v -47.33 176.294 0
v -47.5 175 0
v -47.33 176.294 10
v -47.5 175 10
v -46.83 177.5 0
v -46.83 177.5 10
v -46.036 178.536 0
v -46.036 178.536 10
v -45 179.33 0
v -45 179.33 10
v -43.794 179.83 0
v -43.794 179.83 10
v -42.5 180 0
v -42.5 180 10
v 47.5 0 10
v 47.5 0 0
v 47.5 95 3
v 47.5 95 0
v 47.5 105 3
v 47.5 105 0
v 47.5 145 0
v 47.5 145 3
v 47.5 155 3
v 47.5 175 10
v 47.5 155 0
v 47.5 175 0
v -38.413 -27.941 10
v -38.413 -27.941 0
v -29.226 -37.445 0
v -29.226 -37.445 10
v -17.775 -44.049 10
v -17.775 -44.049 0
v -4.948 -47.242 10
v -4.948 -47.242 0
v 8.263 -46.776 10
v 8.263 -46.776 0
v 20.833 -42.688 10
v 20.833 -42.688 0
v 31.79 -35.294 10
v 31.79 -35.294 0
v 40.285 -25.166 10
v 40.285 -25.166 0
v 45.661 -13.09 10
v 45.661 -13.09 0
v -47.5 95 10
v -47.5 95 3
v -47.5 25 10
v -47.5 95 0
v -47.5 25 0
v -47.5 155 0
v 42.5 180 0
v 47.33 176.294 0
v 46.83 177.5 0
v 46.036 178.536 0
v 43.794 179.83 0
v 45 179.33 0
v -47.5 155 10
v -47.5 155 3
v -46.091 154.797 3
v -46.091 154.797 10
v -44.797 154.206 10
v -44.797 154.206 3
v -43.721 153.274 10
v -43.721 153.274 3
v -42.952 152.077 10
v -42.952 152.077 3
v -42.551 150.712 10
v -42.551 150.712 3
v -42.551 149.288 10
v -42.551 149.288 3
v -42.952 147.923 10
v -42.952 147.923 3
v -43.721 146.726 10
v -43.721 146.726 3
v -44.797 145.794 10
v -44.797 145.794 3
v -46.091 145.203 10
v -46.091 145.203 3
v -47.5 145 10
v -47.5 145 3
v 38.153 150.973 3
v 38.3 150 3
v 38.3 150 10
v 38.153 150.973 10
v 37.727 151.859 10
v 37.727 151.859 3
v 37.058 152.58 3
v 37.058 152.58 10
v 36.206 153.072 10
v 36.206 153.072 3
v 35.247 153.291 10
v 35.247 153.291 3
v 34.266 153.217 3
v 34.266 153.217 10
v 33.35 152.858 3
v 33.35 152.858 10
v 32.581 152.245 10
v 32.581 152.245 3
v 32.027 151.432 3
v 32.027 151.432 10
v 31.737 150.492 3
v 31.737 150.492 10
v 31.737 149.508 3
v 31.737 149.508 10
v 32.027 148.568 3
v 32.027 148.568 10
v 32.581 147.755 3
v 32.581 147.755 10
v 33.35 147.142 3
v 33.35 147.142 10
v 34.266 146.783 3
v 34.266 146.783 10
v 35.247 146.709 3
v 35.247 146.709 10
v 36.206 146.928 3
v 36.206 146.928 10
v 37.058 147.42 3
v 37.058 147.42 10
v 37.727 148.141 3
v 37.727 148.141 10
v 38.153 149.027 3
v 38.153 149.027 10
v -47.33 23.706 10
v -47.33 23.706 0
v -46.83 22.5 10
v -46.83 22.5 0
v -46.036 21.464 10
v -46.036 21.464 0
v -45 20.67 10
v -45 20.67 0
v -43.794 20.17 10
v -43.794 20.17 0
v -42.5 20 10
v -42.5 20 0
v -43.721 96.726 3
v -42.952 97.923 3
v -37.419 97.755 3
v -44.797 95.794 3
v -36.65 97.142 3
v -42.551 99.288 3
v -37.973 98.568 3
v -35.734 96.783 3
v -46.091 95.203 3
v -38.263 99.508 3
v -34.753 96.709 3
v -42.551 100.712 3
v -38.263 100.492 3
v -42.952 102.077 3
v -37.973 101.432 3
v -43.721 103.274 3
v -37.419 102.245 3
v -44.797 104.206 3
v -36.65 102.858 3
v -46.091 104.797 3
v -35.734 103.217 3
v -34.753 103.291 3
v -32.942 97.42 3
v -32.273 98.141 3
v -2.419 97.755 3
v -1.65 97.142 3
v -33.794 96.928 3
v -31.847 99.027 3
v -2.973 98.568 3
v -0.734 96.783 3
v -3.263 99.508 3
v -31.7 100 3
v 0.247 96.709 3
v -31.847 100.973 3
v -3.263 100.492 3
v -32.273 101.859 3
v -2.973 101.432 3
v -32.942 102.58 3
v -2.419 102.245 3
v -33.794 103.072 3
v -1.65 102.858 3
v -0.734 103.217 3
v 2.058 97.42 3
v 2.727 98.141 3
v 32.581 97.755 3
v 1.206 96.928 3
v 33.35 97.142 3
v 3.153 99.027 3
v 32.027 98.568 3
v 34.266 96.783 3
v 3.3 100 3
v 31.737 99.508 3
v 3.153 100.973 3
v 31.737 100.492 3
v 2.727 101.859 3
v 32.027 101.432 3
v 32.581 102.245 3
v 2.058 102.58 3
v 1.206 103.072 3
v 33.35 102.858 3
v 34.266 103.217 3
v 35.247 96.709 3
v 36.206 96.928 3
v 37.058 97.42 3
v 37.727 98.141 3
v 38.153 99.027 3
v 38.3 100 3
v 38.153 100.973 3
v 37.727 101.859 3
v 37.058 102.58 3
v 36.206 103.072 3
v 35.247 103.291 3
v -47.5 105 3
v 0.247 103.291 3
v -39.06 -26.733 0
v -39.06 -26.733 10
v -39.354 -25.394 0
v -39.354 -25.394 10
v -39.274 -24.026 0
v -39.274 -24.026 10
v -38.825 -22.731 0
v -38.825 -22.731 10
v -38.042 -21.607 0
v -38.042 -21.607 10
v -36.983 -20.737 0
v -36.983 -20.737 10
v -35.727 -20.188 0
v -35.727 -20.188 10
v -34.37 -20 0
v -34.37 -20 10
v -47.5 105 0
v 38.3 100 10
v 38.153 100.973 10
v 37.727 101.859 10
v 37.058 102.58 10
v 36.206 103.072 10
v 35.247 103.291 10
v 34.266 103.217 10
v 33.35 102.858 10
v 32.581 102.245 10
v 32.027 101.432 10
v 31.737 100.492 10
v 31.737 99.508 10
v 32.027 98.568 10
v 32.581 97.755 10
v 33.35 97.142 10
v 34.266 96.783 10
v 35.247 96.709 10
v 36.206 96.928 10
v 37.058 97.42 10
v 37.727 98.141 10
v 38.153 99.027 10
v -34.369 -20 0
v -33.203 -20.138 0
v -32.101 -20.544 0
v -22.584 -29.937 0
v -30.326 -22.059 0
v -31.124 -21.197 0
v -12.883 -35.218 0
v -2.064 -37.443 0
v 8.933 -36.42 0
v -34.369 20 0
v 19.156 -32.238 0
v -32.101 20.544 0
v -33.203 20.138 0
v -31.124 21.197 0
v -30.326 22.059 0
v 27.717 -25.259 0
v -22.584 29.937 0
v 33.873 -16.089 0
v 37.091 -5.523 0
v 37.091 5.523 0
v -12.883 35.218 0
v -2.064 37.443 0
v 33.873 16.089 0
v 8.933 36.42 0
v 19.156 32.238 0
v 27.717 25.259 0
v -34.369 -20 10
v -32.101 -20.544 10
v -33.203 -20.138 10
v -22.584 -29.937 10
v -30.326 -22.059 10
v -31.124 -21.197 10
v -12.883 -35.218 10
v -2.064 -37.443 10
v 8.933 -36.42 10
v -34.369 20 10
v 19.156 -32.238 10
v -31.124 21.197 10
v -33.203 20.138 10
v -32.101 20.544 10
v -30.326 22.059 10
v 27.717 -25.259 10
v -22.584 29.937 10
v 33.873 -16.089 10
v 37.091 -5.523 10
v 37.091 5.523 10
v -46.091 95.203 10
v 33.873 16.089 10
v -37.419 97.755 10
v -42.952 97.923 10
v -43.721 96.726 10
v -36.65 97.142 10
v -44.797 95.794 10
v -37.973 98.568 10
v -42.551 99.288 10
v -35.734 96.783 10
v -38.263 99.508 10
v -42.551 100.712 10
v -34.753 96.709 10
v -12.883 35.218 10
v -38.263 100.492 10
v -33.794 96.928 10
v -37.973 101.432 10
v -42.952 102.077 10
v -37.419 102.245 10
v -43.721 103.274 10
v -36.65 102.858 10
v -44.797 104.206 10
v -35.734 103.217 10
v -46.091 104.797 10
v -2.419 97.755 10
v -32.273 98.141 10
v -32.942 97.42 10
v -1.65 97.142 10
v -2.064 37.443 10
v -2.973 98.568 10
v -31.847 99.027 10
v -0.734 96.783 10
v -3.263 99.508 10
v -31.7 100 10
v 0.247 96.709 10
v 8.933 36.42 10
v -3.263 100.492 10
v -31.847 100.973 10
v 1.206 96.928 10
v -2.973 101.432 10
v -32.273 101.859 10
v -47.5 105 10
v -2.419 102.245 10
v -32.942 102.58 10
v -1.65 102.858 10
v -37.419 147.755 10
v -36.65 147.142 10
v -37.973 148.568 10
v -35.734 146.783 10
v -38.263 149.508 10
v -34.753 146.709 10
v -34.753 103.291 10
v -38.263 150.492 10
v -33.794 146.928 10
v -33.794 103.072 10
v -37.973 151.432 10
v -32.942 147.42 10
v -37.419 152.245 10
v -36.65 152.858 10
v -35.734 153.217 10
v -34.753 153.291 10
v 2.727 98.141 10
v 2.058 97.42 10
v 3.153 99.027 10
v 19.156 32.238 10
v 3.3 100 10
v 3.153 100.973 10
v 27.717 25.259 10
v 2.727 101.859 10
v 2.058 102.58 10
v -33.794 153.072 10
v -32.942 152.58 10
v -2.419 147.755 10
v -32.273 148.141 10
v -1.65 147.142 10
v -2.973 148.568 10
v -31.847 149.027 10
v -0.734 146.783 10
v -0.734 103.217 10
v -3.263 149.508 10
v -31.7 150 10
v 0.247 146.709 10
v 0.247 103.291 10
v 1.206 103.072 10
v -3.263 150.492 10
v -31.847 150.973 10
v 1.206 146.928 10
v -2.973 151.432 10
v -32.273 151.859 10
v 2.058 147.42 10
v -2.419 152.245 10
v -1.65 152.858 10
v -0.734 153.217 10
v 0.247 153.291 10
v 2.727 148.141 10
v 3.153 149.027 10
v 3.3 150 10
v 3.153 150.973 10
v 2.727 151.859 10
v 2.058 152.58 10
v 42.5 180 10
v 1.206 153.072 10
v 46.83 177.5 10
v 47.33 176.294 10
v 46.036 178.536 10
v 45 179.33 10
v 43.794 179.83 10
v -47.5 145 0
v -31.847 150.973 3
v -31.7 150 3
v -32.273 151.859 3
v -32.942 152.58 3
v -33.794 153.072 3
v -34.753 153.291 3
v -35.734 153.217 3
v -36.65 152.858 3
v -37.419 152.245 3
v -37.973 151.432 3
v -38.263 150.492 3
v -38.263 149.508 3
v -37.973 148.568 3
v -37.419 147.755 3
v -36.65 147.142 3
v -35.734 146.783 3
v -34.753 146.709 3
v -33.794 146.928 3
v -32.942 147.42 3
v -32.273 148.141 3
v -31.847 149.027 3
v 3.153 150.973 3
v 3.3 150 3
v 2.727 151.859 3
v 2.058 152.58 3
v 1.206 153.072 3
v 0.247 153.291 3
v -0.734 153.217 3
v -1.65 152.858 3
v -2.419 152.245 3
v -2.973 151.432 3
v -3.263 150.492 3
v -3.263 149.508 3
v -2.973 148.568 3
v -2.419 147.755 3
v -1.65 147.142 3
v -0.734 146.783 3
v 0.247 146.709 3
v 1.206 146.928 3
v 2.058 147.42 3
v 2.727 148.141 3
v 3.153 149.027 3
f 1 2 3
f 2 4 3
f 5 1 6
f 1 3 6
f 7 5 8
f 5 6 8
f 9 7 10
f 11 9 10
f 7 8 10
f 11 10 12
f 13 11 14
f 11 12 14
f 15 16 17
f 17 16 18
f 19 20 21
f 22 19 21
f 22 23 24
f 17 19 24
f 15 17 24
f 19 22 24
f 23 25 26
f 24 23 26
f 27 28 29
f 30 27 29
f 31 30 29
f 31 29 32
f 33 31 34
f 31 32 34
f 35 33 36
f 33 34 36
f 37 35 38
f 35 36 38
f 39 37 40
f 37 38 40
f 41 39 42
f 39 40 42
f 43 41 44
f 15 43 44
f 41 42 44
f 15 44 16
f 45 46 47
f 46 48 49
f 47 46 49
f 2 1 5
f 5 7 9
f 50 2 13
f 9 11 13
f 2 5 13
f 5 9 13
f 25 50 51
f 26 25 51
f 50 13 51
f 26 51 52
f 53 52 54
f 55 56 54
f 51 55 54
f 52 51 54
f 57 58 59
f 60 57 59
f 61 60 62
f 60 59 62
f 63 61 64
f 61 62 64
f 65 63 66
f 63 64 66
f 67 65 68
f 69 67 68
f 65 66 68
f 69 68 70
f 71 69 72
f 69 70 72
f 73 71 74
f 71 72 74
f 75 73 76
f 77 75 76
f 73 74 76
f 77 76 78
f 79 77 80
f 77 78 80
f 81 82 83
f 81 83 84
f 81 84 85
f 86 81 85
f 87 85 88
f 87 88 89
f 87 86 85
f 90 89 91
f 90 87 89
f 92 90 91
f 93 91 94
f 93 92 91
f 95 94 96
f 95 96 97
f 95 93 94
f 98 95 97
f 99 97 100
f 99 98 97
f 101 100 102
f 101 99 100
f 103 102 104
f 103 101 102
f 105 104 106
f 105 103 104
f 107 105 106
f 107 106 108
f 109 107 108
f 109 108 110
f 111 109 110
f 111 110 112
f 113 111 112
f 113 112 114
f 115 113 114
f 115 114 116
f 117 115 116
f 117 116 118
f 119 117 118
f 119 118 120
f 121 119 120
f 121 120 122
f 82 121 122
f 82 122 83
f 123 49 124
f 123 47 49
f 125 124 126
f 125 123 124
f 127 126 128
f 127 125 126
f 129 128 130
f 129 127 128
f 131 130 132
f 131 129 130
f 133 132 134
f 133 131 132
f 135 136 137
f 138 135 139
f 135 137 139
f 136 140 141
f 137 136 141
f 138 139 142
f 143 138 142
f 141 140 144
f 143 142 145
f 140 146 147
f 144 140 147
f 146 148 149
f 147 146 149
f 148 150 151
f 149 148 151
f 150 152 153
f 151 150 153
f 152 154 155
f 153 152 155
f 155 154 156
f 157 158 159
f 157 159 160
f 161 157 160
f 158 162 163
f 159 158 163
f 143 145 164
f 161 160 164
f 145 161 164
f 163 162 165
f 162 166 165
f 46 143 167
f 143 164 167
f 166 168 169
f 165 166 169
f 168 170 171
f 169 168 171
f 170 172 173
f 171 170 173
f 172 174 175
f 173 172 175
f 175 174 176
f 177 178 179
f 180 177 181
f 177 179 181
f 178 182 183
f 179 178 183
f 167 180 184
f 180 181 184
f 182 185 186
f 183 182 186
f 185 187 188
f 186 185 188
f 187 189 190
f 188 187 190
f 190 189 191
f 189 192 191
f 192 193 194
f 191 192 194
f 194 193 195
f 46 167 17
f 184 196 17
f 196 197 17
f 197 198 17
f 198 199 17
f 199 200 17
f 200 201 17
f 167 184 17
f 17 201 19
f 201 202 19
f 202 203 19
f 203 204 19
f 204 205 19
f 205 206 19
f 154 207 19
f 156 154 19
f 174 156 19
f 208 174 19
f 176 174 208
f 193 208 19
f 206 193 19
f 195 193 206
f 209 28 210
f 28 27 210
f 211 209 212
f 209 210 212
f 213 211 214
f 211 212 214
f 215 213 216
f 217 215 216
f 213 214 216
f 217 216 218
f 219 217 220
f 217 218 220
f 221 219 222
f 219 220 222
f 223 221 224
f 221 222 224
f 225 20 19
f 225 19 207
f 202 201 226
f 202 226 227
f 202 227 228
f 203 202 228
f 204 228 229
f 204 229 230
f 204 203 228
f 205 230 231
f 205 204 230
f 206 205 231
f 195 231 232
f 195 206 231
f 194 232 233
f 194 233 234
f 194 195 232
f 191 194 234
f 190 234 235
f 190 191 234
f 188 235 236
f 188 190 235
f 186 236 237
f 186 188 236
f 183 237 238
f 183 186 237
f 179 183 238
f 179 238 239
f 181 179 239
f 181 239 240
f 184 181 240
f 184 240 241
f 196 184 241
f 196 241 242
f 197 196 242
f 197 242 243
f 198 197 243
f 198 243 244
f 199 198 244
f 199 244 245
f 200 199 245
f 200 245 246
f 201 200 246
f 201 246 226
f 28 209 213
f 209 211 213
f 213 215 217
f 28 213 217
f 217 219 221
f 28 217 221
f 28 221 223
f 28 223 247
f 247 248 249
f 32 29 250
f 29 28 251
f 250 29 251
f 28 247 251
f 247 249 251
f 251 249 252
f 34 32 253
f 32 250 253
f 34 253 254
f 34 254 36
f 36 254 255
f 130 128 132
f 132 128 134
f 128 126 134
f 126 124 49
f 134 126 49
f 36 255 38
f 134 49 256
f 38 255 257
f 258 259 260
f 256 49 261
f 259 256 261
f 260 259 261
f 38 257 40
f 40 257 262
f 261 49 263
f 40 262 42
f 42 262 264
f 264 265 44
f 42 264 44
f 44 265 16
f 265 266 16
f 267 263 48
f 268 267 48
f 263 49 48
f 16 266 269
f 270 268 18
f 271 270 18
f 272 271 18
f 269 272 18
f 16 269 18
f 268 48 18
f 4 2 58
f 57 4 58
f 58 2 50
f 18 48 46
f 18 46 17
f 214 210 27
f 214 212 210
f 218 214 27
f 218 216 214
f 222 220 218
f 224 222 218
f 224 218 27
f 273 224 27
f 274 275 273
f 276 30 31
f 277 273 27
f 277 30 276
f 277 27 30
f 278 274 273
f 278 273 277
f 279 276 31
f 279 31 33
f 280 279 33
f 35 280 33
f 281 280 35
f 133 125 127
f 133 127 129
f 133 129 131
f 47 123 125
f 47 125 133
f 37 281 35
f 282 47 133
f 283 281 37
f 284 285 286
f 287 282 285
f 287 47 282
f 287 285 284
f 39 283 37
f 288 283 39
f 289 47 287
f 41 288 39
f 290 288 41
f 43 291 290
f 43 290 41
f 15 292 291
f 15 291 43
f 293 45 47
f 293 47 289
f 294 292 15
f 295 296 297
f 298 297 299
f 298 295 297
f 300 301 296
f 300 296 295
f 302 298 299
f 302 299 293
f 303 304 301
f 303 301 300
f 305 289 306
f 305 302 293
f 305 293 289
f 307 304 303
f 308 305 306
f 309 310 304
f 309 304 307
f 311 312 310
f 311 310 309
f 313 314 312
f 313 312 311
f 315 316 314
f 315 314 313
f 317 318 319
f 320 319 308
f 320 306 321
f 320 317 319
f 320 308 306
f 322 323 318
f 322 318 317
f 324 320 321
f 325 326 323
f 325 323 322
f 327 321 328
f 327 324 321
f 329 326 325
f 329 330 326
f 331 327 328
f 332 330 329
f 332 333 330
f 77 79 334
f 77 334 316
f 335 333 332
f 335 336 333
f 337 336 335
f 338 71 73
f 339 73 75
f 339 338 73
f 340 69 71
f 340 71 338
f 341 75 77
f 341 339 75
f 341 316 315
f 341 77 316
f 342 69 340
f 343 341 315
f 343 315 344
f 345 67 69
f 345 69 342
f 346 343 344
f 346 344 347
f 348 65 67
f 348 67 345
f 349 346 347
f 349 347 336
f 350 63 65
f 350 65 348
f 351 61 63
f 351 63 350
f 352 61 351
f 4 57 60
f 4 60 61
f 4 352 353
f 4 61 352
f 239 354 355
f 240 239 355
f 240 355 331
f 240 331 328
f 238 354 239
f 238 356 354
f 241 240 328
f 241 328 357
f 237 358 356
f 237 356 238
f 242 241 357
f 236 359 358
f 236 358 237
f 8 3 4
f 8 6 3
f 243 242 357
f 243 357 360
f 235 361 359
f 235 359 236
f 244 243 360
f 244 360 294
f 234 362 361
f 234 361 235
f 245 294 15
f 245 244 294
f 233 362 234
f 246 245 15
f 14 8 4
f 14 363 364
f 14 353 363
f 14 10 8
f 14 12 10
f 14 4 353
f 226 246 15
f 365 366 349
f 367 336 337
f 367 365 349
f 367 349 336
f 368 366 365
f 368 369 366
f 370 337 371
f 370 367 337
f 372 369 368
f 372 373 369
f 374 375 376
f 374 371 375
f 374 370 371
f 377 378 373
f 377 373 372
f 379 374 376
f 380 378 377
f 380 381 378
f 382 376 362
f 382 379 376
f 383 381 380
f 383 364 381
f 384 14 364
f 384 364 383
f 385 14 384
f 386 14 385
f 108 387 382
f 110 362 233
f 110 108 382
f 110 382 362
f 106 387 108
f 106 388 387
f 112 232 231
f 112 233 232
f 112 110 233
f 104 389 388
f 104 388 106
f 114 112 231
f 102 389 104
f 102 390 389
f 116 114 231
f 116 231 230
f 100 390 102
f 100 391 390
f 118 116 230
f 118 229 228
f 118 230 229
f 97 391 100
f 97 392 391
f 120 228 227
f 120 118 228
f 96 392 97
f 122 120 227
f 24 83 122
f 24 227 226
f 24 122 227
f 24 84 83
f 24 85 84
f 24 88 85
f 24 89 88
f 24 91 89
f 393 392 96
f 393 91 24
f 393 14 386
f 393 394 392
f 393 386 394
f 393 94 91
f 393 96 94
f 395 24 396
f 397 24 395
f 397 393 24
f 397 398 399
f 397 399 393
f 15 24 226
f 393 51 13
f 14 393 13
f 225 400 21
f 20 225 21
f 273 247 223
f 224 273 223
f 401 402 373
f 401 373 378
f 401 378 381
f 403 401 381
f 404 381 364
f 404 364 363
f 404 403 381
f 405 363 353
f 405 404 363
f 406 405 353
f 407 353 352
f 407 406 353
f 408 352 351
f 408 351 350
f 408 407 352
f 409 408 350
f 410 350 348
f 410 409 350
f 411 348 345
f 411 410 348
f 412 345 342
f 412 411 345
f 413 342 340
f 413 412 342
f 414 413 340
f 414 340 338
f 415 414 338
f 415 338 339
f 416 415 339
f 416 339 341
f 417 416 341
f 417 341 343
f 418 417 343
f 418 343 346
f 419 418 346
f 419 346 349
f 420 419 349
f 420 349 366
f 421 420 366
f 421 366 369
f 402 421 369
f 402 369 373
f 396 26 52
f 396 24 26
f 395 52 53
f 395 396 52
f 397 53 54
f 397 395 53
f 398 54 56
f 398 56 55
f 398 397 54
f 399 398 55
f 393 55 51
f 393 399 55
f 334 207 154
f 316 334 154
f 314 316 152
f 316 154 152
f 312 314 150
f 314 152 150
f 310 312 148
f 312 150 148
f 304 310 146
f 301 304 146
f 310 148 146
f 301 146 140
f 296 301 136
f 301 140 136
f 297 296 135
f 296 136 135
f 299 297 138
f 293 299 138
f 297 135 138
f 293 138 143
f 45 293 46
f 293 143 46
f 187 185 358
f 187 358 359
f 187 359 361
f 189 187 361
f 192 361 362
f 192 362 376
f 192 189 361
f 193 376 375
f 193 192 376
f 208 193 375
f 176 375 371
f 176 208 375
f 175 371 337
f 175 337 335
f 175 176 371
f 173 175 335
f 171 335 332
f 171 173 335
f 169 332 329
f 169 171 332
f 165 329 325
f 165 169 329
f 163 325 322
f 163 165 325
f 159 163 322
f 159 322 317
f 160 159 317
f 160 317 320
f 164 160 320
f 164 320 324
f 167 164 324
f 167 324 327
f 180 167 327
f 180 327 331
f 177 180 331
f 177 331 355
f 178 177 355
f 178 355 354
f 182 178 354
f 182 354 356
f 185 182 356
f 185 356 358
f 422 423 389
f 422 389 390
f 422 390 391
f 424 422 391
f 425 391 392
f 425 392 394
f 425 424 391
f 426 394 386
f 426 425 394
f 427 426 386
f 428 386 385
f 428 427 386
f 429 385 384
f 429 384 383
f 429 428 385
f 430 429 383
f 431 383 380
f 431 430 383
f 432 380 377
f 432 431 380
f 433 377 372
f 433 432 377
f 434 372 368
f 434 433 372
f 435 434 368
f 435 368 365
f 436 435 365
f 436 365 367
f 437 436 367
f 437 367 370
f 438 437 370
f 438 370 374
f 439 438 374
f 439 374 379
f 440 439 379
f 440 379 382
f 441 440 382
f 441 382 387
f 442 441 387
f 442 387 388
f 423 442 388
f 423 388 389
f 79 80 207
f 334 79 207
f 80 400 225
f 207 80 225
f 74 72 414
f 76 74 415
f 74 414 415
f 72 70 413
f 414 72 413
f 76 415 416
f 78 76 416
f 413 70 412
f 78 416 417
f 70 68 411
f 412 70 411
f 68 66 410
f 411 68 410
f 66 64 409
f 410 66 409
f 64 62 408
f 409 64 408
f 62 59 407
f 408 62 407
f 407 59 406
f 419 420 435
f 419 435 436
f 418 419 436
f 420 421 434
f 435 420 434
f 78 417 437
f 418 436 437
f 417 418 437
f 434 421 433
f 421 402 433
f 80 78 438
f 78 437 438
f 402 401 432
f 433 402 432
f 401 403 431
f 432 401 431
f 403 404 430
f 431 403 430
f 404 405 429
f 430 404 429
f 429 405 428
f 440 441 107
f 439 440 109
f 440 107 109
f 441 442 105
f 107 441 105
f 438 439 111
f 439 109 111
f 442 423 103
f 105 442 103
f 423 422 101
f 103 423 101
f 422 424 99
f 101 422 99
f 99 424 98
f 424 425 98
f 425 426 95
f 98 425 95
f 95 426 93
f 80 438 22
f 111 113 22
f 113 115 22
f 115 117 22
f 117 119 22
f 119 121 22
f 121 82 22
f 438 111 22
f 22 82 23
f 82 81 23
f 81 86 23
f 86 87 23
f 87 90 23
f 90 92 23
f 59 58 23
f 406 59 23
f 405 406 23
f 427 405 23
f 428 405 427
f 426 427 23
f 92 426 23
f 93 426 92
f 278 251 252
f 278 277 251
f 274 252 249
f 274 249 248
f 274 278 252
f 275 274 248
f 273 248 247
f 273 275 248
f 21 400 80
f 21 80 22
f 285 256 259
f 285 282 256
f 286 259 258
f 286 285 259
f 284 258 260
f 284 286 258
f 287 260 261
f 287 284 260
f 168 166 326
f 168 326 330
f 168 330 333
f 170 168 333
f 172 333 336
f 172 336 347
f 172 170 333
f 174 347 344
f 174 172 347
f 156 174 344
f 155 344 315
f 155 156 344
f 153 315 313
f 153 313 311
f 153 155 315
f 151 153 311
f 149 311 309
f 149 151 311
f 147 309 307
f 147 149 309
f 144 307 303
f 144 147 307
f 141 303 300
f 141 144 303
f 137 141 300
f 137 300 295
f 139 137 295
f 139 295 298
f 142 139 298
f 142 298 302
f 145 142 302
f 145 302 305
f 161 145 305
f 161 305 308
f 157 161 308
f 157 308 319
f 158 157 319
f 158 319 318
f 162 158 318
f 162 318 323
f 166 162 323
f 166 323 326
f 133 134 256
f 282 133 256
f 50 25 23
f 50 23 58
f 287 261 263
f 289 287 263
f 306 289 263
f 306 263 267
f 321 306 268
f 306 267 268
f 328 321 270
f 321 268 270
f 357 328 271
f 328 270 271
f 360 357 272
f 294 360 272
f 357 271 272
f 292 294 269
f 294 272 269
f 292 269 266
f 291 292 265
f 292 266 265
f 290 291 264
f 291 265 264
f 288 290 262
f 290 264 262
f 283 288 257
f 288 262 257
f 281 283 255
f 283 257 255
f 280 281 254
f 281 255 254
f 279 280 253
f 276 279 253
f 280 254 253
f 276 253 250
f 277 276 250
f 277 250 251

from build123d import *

# Parameters (mm, degrees)
SKETCH_1_R          = 3.3
EXTRUDE_1_DEPTH     = 10
SKETCH_1_4_R        = 3.3
CUT_EXTRUDE_1_DEPTH = 3
FILLET_4_R          = 5
FILLET_8_R          = 5


with BuildPart() as part:
    # 스케치1 → 보스-돌출1 (new body)
    with BuildSketch(Plane.XY):
        with BuildLine():
            Line((-47.5, 95), (-47.5, 20))
            Line((-47.5, 20), (-31.721443851, 20))
            ThreePointArc((-31.721443851, 20), (37.5, 0), (-31.721443851, -20))
            Line((-31.721443851, -20), (-43.084219849, -20))
            ThreePointArc((-43.084219849, -20), (10.240838764, -46.382919501), (47.5, 0))
            Line((47.5, 0), (47.5, 180))
            Line((47.5, 180), (-47.5, 180))
            Line((-47.5, 180), (-47.5, 155))
            ThreePointArc((-47.5, 155), (-42.5, 150), (-47.5, 145))
            Line((-47.5, 145), (-47.5, 105))
            ThreePointArc((-47.5, 105), (-42.5, 100), (-47.5, 95))
        make_face()
        with Locations((35, 100)):
            Circle(SKETCH_1_R, mode=Mode.SUBTRACT)
        with Locations((-35, 100)):
            Circle(SKETCH_1_R, mode=Mode.SUBTRACT)
        with Locations((0, 100)):
            Circle(SKETCH_1_R, mode=Mode.SUBTRACT)
        with Locations((35, 150)):
            Circle(SKETCH_1_R, mode=Mode.SUBTRACT)
        with Locations((-35, 150)):
            Circle(SKETCH_1_R, mode=Mode.SUBTRACT)
        with Locations((0, 150)):
            Circle(SKETCH_1_R, mode=Mode.SUBTRACT)
    extrude(amount=EXTRUDE_1_DEPTH)

    # 스케치1<4> → 컷-돌출1 (cut)
    # profile 1 of 2: a face of its own
    with BuildSketch(Plane.XY):
        with BuildLine():
            ThreePointArc((-47.5, 105), (-42.5, 100), (-47.5, 95))
            Line((-47.5, 95), (47.5, 95))
            Line((47.5, 95), (47.5, 105))
            Line((47.5, 105), (-47.5, 105))
        make_face()
        with Locations((-35, 100)):
            Circle(SKETCH_1_4_R, mode=Mode.SUBTRACT)
        with Locations((0, 100)):
            Circle(SKETCH_1_4_R, mode=Mode.SUBTRACT)
        with Locations((35, 100)):
            Circle(SKETCH_1_4_R, mode=Mode.SUBTRACT)
    # profile 2 of 2: a face of its own
    with BuildSketch(Plane.XY):
        with BuildLine():
            ThreePointArc((-47.5, 155), (-42.5, 150), (-47.5, 145))
            Line((-47.5, 145), (47.5, 145))
            Line((47.5, 145), (47.5, 155))
            Line((47.5, 155), (-47.5, 155))
        make_face()
        with Locations((-35, 150)):
            Circle(SKETCH_1_4_R, mode=Mode.SUBTRACT)
        with Locations((0, 150)):
            Circle(SKETCH_1_4_R, mode=Mode.SUBTRACT)
        with Locations((35, 150)):
            Circle(SKETCH_1_4_R, mode=Mode.SUBTRACT)
    extrude(amount=CUT_EXTRUDE_1_DEPTH, mode=Mode.SUBTRACT)

    # 필렛4
    fillet_4_edges = [part.edges().sort_by_distance(p)[0] for p in [
        (-31.721443851, 20, 5),
        (-47.5, 20, 5),
        (-31.721443851, -20, 5),
        (-43.084219849, -20, 5),
    ]]
    fillet(fillet_4_edges, radius=FILLET_4_R - 0.0001)  # a hair under: the kernel refuses the full size

    # 필렛8
    fillet_8_edges = [part.edges().sort_by_distance(p)[0] for p in [
        (-47.5, 180, 5),
        (47.5, 180, 5),
    ]]
    fillet(fillet_8_edges, radius=FILLET_8_R)


solid = part.part
